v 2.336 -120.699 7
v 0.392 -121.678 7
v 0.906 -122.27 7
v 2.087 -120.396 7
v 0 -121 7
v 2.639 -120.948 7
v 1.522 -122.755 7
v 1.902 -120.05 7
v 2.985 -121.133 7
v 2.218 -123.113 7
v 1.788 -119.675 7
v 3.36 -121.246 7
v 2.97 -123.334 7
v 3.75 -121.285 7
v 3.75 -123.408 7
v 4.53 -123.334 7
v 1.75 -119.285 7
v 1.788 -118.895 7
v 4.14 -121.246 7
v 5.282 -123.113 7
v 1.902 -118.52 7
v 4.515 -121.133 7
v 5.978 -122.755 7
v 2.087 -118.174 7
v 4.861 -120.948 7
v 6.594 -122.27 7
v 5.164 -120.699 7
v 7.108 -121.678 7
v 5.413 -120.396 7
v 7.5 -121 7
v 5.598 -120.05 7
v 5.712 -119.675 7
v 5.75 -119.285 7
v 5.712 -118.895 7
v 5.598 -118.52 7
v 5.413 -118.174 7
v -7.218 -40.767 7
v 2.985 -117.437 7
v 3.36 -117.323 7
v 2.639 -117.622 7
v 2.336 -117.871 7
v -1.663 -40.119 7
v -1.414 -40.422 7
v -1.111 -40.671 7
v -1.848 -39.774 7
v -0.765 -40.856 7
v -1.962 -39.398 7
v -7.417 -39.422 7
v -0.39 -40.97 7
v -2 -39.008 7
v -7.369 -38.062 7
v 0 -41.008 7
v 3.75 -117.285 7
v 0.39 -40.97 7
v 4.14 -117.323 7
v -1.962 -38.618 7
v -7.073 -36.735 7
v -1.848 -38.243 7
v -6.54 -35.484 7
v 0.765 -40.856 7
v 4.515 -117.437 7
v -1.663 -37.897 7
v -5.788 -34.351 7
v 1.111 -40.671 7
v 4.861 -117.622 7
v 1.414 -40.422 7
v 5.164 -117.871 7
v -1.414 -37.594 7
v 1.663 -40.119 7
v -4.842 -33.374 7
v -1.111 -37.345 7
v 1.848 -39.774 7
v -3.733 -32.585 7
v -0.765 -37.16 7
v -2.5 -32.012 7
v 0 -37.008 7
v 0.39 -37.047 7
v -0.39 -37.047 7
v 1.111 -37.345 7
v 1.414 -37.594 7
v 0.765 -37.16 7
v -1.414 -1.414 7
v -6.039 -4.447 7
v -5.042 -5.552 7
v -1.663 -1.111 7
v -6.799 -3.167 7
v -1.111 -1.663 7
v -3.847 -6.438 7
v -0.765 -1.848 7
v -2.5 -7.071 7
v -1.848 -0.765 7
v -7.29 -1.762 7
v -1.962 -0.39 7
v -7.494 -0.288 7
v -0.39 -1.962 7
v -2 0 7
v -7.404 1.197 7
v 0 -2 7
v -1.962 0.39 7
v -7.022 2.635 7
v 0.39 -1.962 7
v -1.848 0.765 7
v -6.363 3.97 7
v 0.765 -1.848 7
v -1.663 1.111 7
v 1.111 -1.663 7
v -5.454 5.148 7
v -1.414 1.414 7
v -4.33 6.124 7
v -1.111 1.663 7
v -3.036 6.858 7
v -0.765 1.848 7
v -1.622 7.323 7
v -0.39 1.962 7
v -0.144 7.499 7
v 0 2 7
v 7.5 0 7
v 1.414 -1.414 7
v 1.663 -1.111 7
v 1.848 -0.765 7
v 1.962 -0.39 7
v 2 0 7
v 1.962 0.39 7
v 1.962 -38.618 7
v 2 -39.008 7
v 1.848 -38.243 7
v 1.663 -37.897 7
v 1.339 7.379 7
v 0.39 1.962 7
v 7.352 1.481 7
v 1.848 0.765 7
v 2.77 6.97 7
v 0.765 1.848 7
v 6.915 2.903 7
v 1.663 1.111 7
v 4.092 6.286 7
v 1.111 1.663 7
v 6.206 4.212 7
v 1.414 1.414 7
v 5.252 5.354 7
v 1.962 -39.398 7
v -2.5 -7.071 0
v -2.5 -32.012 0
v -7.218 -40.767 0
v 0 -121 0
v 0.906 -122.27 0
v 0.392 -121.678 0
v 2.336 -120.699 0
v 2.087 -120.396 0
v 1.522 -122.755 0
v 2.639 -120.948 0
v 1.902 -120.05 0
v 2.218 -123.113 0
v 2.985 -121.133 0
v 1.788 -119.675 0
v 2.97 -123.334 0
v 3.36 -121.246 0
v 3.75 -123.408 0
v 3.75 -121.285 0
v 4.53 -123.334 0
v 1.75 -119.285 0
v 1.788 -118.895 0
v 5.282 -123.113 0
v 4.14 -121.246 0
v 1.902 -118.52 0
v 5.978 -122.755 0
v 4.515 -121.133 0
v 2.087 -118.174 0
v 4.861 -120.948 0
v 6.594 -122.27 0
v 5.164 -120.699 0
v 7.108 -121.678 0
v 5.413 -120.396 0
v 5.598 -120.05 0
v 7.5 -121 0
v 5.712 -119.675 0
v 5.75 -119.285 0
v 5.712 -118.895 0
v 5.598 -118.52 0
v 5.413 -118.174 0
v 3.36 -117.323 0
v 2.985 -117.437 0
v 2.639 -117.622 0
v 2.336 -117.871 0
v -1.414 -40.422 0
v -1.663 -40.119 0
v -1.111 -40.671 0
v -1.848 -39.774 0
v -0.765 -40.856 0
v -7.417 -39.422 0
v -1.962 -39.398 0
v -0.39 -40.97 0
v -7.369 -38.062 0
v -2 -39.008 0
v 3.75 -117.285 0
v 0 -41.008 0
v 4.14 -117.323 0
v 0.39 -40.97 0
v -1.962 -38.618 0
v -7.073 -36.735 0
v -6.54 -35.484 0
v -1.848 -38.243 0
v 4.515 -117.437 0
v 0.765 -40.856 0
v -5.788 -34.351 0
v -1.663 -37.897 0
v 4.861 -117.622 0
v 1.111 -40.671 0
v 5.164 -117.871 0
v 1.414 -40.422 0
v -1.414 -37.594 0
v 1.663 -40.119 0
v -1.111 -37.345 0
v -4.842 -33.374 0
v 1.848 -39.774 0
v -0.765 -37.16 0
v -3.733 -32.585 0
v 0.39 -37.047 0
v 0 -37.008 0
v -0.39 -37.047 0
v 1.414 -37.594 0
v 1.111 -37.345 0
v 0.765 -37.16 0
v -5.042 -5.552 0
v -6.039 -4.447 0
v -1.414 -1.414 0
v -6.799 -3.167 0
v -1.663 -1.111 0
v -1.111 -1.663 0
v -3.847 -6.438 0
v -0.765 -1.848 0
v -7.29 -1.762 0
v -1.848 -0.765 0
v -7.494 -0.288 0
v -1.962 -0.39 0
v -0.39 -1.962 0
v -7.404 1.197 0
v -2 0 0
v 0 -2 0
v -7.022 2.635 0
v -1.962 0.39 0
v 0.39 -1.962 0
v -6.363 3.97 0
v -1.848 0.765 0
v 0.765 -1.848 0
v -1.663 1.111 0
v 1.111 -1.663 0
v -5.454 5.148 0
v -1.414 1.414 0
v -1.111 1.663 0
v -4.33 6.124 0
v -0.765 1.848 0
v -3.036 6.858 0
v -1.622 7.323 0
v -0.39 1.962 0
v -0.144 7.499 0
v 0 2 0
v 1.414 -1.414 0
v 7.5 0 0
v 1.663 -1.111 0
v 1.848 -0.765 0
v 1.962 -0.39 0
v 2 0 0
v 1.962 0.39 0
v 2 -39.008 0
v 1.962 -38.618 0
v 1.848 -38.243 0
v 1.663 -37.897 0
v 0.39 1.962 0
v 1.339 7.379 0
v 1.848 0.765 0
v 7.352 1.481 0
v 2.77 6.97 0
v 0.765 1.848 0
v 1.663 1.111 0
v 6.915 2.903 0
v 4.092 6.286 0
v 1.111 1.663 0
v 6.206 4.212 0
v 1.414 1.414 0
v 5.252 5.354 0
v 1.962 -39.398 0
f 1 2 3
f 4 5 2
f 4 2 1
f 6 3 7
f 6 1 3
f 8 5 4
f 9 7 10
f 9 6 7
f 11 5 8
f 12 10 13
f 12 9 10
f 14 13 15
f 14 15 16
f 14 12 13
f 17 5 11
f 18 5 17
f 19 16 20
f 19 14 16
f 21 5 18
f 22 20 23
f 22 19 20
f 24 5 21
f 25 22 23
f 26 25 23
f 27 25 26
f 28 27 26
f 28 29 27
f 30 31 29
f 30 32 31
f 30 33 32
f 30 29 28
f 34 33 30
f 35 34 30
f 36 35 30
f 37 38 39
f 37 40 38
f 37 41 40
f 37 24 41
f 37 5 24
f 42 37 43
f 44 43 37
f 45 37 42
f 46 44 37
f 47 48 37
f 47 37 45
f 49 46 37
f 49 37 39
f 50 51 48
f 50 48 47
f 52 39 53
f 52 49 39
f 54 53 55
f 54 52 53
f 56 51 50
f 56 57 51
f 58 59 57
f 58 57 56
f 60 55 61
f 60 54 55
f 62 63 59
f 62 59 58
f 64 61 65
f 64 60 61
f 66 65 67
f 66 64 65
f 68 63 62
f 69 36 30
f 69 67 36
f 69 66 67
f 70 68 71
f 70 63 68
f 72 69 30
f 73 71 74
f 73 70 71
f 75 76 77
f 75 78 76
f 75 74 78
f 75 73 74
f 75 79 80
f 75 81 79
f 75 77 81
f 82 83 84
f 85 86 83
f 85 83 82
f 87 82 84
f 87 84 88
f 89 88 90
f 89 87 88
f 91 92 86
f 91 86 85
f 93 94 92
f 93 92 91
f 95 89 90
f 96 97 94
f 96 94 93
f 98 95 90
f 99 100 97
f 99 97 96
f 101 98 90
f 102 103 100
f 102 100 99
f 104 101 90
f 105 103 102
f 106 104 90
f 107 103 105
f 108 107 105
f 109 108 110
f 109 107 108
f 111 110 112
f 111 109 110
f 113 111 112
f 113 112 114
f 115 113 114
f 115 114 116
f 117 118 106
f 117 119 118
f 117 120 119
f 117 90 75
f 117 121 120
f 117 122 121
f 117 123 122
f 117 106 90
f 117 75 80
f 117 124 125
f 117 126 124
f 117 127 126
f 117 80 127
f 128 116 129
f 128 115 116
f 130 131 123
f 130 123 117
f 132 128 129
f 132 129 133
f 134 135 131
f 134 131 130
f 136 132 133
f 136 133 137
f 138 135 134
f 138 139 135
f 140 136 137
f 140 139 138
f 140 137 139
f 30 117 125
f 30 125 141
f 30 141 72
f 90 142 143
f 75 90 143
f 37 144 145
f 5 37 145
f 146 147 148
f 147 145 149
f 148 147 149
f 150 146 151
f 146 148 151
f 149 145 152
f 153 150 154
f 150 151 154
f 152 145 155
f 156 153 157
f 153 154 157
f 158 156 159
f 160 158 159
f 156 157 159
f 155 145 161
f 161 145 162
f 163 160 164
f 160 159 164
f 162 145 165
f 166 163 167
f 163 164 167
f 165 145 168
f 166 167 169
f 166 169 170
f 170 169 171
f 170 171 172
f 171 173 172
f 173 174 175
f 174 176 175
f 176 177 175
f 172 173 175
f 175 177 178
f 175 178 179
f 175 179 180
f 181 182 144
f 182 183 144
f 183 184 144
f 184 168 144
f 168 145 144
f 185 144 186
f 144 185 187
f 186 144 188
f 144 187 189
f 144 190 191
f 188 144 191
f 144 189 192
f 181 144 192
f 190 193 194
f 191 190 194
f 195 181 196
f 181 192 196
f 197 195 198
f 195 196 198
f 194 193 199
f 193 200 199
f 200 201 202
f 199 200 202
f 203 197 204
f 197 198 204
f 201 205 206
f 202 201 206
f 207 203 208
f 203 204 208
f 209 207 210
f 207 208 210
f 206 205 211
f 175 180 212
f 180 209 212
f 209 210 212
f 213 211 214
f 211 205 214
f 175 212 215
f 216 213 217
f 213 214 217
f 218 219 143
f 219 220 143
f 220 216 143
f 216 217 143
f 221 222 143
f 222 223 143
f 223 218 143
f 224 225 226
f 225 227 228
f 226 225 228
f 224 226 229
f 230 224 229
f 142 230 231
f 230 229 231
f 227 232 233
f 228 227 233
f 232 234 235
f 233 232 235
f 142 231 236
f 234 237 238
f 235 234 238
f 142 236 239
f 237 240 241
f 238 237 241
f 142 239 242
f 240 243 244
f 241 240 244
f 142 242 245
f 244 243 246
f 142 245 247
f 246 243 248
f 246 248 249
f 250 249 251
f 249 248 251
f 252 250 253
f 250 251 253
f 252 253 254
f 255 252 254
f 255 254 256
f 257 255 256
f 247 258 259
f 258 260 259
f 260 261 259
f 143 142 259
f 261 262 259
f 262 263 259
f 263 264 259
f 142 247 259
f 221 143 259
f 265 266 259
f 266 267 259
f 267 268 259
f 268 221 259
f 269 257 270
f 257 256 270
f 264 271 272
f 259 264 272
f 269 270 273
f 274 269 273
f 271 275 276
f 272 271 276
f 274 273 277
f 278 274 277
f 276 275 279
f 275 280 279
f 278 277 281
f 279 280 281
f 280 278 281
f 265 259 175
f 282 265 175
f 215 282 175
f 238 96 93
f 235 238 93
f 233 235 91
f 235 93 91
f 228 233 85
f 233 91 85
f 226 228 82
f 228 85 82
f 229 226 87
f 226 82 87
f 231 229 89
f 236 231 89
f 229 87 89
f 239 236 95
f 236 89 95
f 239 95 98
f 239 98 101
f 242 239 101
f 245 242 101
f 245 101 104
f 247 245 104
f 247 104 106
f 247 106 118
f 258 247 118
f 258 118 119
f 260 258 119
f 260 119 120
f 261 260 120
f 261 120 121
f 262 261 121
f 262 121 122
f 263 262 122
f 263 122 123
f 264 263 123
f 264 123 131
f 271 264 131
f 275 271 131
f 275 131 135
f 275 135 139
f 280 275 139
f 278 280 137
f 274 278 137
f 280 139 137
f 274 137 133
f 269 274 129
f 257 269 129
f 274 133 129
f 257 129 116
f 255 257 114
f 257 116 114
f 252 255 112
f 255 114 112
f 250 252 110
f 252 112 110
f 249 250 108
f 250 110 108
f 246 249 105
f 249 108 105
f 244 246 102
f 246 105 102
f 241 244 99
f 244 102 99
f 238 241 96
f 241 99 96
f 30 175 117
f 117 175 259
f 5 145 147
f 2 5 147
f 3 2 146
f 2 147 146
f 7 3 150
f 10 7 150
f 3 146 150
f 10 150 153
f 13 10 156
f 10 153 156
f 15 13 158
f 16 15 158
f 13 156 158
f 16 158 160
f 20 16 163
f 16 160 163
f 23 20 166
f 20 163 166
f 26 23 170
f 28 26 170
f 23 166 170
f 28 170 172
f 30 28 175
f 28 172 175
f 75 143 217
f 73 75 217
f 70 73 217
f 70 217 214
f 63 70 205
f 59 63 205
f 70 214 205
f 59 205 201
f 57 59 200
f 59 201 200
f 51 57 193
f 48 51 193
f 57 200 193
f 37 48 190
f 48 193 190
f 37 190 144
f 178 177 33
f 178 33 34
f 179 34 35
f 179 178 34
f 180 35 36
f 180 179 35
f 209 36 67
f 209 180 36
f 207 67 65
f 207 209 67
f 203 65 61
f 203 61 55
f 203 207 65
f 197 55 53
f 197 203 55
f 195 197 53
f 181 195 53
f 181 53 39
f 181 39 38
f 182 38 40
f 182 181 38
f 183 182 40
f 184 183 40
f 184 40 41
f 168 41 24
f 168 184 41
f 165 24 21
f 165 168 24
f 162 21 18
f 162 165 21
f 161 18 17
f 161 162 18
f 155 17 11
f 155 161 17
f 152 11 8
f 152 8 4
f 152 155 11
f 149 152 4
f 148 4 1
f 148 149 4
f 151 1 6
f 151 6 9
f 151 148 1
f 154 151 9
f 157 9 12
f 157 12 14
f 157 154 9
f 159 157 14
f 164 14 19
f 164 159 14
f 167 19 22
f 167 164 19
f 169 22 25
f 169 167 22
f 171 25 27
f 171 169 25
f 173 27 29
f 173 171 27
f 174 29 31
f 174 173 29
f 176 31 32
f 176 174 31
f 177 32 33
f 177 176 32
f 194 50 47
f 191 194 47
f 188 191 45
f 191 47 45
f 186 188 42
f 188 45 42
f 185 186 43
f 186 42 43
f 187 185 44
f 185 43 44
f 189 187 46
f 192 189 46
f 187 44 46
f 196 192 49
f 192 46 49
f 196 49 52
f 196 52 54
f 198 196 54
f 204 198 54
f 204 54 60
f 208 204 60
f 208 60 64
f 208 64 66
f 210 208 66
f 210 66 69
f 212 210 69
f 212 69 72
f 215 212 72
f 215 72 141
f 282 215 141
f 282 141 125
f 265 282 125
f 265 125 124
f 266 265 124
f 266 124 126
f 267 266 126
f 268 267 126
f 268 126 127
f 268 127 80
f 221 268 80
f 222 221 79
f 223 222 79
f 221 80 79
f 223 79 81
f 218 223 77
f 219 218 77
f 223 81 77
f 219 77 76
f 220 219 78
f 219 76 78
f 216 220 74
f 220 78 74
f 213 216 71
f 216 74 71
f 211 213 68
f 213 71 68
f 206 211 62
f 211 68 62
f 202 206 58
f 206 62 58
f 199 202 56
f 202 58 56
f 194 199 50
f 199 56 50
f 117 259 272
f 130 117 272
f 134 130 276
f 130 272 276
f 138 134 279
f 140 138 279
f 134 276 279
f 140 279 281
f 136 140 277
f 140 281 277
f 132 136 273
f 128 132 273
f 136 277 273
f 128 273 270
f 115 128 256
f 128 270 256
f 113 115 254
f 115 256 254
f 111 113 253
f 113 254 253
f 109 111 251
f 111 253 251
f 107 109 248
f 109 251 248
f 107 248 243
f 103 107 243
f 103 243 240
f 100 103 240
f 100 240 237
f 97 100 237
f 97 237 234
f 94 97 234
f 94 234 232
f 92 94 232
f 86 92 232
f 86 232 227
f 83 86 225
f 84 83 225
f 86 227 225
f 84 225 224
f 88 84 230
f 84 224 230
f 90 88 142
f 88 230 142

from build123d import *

# Parameters (mm, degrees)
F0_R     = 2
F1_DEPTH = 7
F2_D     = 4
F3_D     = 4


with BuildPart() as f1:
    # F0 (on Top) → F1 (new body)
    with BuildSketch(Plane.XY):
        with BuildLine():
            Line((7.5, -41), (7.5, 0))
            ThreePointArc((7.5, 0), (-4.3301270189, 6.123724357), (-2.5, -7.0710678119))
            Line((-2.5, -7.0710678119), (-2.5, -32.0124984811))
            ThreePointArc((-2.5, -32.0124984811), (-6.5397745633, -35.4838365332), (-7.2178157357, -40.7668495526))
            Line((-7.2178157357, -40.7668495526), (0, -121))
            ThreePointArc((0, -121), (3.75, -123.4084825035), (7.5, -121))
            Line((7.5, -121), (7.5, -41))
        make_face()
        with Locations((3.75, -119.2848719021)):
            Circle(F0_R, mode=Mode.SUBTRACT)
    extrude(amount=F1_DEPTH)

    # F2 (through all)
    with Locations(Plane(origin=(0, 0, 0), x_dir=(1, 0, 0), z_dir=(0, 0, -1))):
        with Locations((0, 0)):
            Hole(F2_D / 2)

    # F3 (through all)
    with Locations(Plane(origin=(0, 0, 0), x_dir=(1, 0, 0), z_dir=(0, 0, -1))):
        with Locations((0, 39.008192718)):
            Hole(F3_D / 2)


solid = f1.part
